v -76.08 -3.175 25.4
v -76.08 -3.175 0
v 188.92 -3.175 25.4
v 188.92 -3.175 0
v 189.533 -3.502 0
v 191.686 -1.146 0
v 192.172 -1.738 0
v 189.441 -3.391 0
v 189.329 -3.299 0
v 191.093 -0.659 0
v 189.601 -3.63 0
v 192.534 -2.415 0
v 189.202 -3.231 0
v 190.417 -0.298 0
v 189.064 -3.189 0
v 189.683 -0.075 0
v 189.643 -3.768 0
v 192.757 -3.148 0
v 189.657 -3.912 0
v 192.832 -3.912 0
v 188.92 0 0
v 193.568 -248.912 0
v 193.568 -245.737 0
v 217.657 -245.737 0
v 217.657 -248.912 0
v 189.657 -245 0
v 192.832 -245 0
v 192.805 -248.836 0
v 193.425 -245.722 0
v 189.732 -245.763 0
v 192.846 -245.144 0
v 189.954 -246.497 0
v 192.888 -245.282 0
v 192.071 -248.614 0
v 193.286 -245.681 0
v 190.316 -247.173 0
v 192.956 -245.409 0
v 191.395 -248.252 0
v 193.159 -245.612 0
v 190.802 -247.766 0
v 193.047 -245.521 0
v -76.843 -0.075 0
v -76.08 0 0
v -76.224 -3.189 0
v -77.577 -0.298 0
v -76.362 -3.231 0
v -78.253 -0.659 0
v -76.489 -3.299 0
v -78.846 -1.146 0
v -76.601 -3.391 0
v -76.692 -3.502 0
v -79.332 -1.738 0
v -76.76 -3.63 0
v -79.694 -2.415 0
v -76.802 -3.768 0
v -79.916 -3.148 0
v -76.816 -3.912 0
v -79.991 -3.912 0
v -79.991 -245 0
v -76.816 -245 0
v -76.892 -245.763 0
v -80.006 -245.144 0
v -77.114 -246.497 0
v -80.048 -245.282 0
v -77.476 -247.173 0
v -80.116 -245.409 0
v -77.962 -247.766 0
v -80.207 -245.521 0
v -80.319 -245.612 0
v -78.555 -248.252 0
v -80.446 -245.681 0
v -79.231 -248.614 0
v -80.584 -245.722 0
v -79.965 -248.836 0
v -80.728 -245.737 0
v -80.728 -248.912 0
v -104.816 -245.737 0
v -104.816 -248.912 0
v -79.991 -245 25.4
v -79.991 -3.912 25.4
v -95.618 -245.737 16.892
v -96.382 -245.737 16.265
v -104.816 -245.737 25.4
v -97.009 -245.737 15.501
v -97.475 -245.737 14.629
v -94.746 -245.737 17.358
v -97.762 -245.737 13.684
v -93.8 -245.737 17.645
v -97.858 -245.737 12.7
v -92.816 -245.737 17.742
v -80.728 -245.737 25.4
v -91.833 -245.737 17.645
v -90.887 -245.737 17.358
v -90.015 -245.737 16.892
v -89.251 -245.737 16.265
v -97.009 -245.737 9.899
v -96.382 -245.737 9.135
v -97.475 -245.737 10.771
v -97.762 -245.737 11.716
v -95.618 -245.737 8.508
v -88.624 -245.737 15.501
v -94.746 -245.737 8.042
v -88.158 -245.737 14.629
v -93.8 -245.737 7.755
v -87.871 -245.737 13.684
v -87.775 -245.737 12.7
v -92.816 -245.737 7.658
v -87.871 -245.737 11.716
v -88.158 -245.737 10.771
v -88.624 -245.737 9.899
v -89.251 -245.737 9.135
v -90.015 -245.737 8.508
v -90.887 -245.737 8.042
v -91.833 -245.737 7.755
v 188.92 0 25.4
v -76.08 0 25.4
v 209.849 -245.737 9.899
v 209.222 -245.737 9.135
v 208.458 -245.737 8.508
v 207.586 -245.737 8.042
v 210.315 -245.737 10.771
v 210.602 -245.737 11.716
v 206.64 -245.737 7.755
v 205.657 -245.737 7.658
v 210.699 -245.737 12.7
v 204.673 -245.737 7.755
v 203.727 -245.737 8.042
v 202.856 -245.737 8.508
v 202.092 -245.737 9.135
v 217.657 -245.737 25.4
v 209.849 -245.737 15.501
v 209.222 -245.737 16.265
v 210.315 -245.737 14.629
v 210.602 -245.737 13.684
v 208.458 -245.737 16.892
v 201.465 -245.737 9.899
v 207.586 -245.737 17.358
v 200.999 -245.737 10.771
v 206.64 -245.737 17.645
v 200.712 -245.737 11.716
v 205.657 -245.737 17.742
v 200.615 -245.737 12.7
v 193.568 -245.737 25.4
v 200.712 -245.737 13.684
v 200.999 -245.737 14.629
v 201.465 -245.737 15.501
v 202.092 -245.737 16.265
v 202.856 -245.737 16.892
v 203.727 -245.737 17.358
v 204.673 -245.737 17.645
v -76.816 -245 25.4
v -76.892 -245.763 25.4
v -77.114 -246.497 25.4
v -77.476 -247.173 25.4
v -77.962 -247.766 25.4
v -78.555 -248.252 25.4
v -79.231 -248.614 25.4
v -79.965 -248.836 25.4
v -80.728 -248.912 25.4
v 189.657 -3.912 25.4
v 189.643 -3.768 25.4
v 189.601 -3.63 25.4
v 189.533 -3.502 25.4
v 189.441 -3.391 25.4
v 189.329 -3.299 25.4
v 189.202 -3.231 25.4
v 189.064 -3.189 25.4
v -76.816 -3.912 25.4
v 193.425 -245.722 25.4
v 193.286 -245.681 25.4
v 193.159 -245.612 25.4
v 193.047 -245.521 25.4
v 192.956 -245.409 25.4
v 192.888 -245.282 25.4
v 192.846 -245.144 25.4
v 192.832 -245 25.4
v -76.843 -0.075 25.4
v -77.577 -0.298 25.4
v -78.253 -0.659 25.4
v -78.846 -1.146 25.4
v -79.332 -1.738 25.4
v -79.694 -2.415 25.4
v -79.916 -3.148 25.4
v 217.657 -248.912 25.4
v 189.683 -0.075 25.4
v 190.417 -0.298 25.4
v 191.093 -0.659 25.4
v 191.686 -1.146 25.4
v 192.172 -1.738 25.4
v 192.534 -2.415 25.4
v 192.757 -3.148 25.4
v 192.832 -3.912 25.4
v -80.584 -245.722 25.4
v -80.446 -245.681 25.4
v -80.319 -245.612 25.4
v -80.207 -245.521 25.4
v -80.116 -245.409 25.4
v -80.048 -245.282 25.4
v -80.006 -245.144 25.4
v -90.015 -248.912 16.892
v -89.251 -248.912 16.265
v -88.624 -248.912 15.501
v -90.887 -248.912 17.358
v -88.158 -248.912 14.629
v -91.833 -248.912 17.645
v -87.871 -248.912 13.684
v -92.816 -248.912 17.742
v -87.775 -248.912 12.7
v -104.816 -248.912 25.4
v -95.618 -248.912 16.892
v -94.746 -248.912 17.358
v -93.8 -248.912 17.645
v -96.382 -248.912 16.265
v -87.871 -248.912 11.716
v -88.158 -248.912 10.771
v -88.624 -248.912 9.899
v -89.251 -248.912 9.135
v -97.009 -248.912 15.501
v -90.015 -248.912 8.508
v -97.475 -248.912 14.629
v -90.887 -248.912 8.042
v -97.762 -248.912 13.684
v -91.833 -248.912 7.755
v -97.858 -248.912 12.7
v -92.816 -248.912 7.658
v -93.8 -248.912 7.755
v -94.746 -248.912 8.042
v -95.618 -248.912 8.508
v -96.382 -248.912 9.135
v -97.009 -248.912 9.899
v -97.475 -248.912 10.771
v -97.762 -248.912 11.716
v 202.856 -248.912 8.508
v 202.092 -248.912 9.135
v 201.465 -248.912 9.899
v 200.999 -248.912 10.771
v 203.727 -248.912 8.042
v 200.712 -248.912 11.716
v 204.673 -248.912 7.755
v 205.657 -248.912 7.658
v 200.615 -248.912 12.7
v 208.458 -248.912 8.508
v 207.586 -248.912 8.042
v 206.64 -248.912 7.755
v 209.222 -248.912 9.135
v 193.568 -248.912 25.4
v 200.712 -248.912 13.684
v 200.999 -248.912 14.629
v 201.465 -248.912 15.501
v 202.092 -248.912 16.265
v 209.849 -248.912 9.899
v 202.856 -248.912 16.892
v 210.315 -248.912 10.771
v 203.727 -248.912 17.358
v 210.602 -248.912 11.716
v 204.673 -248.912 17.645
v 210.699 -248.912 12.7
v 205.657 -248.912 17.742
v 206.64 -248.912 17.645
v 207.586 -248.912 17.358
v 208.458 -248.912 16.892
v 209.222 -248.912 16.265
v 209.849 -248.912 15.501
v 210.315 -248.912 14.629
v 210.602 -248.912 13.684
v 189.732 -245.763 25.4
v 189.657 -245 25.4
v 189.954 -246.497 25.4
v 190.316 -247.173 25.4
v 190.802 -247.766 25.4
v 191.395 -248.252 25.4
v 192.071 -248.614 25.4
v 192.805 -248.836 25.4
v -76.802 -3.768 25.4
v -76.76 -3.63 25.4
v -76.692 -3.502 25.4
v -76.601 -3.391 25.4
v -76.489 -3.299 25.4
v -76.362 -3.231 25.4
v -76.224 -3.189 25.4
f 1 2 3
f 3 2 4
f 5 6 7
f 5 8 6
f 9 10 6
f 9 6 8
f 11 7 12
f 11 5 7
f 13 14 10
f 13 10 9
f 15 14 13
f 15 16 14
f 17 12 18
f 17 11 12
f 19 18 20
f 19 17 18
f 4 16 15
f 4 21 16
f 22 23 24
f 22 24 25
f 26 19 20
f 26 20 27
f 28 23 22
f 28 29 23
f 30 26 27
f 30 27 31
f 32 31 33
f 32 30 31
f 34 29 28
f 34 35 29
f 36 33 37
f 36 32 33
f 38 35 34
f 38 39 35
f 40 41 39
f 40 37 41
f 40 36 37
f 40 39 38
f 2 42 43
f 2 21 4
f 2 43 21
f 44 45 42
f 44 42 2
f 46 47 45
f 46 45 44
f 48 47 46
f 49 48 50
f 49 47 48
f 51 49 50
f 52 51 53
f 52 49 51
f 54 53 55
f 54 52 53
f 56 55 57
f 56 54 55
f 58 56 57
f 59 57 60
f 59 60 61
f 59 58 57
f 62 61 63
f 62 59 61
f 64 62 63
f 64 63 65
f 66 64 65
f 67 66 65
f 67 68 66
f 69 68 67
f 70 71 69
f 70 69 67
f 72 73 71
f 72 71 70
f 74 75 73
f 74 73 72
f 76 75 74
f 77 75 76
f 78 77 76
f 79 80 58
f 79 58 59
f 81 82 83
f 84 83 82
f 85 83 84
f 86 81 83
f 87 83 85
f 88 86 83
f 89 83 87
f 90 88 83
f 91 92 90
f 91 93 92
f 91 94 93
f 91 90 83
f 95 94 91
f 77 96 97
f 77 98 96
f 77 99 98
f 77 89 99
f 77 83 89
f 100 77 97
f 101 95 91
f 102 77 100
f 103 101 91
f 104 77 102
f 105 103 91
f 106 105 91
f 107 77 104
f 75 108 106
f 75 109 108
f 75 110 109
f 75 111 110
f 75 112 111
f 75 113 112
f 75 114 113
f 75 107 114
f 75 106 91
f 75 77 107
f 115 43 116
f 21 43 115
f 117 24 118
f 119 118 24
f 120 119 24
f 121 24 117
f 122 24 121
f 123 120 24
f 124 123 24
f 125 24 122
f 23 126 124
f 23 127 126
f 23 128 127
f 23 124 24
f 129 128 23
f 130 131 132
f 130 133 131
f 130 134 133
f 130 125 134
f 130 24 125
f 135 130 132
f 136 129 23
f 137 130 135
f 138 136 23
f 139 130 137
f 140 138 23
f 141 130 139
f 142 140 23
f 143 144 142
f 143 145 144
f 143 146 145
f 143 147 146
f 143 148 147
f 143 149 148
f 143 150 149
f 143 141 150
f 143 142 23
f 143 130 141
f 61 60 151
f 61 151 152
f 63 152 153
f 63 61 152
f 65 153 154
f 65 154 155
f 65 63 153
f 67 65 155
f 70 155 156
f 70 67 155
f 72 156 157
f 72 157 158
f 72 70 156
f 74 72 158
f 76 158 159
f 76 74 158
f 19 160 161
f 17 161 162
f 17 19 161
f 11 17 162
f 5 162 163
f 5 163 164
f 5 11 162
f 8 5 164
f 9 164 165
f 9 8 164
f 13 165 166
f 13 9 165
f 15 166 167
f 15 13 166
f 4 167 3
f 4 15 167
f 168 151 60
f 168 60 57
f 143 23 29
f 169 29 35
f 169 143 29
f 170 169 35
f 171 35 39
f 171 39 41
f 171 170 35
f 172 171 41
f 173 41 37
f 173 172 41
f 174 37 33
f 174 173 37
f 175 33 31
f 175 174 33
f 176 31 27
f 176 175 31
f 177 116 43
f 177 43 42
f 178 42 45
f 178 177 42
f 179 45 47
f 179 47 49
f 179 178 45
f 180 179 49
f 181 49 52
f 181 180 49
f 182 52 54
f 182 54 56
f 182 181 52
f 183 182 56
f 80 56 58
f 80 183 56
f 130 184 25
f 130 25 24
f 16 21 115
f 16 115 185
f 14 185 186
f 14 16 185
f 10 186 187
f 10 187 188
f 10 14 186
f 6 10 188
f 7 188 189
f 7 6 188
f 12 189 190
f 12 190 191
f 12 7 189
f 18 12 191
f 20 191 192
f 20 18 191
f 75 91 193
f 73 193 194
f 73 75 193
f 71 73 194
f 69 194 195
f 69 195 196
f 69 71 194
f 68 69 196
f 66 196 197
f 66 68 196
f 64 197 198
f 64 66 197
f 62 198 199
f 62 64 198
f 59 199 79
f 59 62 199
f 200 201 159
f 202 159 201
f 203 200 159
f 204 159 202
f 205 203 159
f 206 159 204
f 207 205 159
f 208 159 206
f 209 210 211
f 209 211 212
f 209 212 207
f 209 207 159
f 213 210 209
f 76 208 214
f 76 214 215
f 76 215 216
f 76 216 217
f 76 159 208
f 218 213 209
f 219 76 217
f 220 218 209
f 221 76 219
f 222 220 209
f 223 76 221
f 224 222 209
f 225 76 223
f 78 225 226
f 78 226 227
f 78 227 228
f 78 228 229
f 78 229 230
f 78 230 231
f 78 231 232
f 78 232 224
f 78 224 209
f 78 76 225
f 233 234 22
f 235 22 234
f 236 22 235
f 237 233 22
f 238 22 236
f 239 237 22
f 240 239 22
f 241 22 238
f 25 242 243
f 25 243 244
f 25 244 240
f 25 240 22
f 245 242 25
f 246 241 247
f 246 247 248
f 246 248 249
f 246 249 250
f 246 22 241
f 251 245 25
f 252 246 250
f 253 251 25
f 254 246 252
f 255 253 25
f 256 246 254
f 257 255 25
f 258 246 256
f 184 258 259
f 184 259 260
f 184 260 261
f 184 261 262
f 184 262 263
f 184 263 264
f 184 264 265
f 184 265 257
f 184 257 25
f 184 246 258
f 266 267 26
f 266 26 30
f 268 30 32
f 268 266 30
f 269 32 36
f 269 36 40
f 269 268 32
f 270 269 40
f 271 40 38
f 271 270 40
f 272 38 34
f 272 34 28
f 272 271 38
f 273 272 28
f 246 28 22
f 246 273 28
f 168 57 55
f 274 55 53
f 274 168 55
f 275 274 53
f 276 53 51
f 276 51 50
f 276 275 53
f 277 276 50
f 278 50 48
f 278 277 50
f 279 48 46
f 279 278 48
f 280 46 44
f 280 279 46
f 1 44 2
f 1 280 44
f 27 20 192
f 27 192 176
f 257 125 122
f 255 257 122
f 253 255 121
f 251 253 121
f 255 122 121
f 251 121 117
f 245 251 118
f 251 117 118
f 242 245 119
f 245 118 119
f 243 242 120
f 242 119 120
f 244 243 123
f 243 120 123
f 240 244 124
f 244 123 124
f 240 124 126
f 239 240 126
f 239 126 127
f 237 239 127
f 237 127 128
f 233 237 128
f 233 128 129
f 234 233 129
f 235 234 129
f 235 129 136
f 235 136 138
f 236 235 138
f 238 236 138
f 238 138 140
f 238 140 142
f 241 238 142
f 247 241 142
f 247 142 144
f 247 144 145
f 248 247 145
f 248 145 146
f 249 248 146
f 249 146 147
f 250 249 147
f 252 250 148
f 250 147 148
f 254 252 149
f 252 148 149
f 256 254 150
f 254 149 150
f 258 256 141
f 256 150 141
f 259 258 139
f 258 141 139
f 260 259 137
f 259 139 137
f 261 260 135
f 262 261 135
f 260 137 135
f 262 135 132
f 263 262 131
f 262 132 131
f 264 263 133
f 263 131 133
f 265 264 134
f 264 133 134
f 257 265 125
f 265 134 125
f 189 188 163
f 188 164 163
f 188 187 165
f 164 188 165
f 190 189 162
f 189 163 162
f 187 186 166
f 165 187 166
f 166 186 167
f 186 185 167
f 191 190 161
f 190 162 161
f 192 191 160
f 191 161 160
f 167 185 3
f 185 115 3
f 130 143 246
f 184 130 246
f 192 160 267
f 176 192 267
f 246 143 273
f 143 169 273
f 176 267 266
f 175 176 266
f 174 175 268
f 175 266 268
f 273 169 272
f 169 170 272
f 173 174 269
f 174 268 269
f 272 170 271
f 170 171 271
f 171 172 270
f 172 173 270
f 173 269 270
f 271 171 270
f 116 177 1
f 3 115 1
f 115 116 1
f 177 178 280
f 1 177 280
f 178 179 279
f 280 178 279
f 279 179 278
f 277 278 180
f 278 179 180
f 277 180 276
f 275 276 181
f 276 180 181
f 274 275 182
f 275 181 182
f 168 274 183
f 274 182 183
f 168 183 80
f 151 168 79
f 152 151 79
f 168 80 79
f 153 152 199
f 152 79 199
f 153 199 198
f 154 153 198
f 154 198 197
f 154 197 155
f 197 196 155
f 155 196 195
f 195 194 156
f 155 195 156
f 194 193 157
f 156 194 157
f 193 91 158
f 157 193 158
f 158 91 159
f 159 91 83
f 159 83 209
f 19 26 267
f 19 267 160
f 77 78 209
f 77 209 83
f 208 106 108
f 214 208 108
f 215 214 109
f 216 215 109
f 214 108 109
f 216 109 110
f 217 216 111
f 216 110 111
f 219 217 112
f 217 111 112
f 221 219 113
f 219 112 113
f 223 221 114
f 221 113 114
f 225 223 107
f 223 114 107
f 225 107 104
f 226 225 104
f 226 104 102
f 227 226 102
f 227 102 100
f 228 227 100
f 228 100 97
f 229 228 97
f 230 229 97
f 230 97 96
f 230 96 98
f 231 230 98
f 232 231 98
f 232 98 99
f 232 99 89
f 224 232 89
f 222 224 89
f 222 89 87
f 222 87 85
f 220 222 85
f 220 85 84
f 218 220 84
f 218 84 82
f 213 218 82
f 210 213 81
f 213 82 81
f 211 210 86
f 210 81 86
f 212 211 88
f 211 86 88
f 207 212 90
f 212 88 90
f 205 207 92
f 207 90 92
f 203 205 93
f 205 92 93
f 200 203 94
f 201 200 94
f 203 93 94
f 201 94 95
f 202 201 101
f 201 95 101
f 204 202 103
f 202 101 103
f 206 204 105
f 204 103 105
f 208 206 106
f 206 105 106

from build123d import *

# Parameters (mm, degrees)
CROQUIS1_W                    = 265
CROQUIS1_H                    = 3.175
BRIDA_BASE1_DEPTH             = 25.4
BRIDA_DE_ARISTA1_DEPTH        = 25.4
BRIDA_DE_ARISTA1_BEND_DEPTH   = 25.4
BRIDA_DE_ARISTA2_DEPTH        = 25.4
BRIDA_DE_ARISTA2_BEND_DEPTH   = 25.4
TALADRO_DE_MARGEN_PARA_3_81_D = 10.0838


# Sheet-metal steps are written as plain solids
with BuildPart() as part:
    # Croquis1 → Brida base1 (new body)
    with BuildSketch(Plane.XY):
        with Locations((56.420112782, -1.5875)):
            Rectangle(CROQUIS1_W, CROQUIS1_H)
    extrude(amount=BRIDA_BASE1_DEPTH)

    # Brida de arista1 section (across the edge) → Brida de arista1 (add)
    with BuildSketch(Plane(origin=(189.656712782, -3.175, 0), x_dir=(-1, 0, 0), z_dir=(0, 0, 1))):
        with BuildLine():
            Line((-3.175, 0.7366), (-3.175, 241.825))
            Line((-3.175, 241.825), (0, 241.825))
            Line((0, 241.825), (0, 0.7366))
            ThreePointArc((0, 0.7366), (0.215745145, 0.215745145), (0.7366, 0))
            Line((0.7366, 0), (0.7366, -3.175))
            ThreePointArc((0.7366, -3.175), (-2.029318885, -2.029318885), (-3.175, 0.7366))
        make_face()
    extrude(amount=BRIDA_DE_ARISTA1_DEPTH)

    # Brida de arista1 section 2 (across the edge) → Brida de arista1 bend (add)
    with BuildSketch(Plane(origin=(-76.816487218, -3.175, 25.4), x_dir=(1, 0, 0), z_dir=(0, 0, -1))):
        with BuildLine():
            Line((-3.175, 0.7366), (-3.175, 241.825))
            Line((-3.175, 241.825), (0, 241.825))
            Line((0, 241.825), (0, 0.7366))
            ThreePointArc((0, 0.7366), (0.215745145, 0.215745145), (0.7366, 0))
            Line((0.7366, 0), (0.7366, -3.175))
            ThreePointArc((0.7366, -3.175), (-2.029318885, -2.029318885), (-3.175, 0.7366))
        make_face()
    extrude(amount=BRIDA_DE_ARISTA1_BEND_DEPTH)

    # Brida de arista2 section (across the edge) → Brida de arista2 (add)
    with BuildSketch(Plane(origin=(192.831712782, -245.7366, 25.4), x_dir=(0, 1, 0), z_dir=(0, 0, -1))):
        with BuildLine():
            Line((-3.175, 0.7366), (-3.175, 24.825))
            Line((-3.175, 24.825), (0, 24.825))
            Line((0, 24.825), (0, 0.7366))
            ThreePointArc((0, 0.7366), (0.215745145, 0.215745145), (0.7366, 0))
            Line((0.7366, 0), (0.7366, -3.175))
            ThreePointArc((0.7366, -3.175), (-2.029318885, -2.029318885), (-3.175, 0.7366))
        make_face()
    extrude(amount=BRIDA_DE_ARISTA2_DEPTH)

    # Brida de arista2 section 2 (across the edge) → Brida de arista2 bend (add)
    with BuildSketch(Plane(origin=(-79.991487218, -245.7366, 0), x_dir=(0, 1, 0), z_dir=(0, 0, 1))):
        with BuildLine():
            Line((-3.175, 0.7366), (-3.175, 24.825))
            Line((-3.175, 24.825), (0, 24.825))
            Line((0, 24.825), (0, 0.7366))
            ThreePointArc((0, 0.7366), (0.215745145, 0.215745145), (0.7366, 0))
            Line((0.7366, 0), (0.7366, -3.175))
            ThreePointArc((0.7366, -3.175), (-2.029318885, -2.029318885), (-3.175, 0.7366))
        make_face()
    extrude(amount=BRIDA_DE_ARISTA2_BEND_DEPTH)

    # Taladro de margen para 3/81 (through all)
    with Locations(Plane(origin=(0, -248.9116, 0), x_dir=(-1, 0, 0), z_dir=(0, -1, 0))):
        with Locations((92.816487218, -12.7), (-205.656712782, -12.7)):
            Hole(TALADRO_DE_MARGEN_PARA_3_81_D / 2)


solid = part.part
